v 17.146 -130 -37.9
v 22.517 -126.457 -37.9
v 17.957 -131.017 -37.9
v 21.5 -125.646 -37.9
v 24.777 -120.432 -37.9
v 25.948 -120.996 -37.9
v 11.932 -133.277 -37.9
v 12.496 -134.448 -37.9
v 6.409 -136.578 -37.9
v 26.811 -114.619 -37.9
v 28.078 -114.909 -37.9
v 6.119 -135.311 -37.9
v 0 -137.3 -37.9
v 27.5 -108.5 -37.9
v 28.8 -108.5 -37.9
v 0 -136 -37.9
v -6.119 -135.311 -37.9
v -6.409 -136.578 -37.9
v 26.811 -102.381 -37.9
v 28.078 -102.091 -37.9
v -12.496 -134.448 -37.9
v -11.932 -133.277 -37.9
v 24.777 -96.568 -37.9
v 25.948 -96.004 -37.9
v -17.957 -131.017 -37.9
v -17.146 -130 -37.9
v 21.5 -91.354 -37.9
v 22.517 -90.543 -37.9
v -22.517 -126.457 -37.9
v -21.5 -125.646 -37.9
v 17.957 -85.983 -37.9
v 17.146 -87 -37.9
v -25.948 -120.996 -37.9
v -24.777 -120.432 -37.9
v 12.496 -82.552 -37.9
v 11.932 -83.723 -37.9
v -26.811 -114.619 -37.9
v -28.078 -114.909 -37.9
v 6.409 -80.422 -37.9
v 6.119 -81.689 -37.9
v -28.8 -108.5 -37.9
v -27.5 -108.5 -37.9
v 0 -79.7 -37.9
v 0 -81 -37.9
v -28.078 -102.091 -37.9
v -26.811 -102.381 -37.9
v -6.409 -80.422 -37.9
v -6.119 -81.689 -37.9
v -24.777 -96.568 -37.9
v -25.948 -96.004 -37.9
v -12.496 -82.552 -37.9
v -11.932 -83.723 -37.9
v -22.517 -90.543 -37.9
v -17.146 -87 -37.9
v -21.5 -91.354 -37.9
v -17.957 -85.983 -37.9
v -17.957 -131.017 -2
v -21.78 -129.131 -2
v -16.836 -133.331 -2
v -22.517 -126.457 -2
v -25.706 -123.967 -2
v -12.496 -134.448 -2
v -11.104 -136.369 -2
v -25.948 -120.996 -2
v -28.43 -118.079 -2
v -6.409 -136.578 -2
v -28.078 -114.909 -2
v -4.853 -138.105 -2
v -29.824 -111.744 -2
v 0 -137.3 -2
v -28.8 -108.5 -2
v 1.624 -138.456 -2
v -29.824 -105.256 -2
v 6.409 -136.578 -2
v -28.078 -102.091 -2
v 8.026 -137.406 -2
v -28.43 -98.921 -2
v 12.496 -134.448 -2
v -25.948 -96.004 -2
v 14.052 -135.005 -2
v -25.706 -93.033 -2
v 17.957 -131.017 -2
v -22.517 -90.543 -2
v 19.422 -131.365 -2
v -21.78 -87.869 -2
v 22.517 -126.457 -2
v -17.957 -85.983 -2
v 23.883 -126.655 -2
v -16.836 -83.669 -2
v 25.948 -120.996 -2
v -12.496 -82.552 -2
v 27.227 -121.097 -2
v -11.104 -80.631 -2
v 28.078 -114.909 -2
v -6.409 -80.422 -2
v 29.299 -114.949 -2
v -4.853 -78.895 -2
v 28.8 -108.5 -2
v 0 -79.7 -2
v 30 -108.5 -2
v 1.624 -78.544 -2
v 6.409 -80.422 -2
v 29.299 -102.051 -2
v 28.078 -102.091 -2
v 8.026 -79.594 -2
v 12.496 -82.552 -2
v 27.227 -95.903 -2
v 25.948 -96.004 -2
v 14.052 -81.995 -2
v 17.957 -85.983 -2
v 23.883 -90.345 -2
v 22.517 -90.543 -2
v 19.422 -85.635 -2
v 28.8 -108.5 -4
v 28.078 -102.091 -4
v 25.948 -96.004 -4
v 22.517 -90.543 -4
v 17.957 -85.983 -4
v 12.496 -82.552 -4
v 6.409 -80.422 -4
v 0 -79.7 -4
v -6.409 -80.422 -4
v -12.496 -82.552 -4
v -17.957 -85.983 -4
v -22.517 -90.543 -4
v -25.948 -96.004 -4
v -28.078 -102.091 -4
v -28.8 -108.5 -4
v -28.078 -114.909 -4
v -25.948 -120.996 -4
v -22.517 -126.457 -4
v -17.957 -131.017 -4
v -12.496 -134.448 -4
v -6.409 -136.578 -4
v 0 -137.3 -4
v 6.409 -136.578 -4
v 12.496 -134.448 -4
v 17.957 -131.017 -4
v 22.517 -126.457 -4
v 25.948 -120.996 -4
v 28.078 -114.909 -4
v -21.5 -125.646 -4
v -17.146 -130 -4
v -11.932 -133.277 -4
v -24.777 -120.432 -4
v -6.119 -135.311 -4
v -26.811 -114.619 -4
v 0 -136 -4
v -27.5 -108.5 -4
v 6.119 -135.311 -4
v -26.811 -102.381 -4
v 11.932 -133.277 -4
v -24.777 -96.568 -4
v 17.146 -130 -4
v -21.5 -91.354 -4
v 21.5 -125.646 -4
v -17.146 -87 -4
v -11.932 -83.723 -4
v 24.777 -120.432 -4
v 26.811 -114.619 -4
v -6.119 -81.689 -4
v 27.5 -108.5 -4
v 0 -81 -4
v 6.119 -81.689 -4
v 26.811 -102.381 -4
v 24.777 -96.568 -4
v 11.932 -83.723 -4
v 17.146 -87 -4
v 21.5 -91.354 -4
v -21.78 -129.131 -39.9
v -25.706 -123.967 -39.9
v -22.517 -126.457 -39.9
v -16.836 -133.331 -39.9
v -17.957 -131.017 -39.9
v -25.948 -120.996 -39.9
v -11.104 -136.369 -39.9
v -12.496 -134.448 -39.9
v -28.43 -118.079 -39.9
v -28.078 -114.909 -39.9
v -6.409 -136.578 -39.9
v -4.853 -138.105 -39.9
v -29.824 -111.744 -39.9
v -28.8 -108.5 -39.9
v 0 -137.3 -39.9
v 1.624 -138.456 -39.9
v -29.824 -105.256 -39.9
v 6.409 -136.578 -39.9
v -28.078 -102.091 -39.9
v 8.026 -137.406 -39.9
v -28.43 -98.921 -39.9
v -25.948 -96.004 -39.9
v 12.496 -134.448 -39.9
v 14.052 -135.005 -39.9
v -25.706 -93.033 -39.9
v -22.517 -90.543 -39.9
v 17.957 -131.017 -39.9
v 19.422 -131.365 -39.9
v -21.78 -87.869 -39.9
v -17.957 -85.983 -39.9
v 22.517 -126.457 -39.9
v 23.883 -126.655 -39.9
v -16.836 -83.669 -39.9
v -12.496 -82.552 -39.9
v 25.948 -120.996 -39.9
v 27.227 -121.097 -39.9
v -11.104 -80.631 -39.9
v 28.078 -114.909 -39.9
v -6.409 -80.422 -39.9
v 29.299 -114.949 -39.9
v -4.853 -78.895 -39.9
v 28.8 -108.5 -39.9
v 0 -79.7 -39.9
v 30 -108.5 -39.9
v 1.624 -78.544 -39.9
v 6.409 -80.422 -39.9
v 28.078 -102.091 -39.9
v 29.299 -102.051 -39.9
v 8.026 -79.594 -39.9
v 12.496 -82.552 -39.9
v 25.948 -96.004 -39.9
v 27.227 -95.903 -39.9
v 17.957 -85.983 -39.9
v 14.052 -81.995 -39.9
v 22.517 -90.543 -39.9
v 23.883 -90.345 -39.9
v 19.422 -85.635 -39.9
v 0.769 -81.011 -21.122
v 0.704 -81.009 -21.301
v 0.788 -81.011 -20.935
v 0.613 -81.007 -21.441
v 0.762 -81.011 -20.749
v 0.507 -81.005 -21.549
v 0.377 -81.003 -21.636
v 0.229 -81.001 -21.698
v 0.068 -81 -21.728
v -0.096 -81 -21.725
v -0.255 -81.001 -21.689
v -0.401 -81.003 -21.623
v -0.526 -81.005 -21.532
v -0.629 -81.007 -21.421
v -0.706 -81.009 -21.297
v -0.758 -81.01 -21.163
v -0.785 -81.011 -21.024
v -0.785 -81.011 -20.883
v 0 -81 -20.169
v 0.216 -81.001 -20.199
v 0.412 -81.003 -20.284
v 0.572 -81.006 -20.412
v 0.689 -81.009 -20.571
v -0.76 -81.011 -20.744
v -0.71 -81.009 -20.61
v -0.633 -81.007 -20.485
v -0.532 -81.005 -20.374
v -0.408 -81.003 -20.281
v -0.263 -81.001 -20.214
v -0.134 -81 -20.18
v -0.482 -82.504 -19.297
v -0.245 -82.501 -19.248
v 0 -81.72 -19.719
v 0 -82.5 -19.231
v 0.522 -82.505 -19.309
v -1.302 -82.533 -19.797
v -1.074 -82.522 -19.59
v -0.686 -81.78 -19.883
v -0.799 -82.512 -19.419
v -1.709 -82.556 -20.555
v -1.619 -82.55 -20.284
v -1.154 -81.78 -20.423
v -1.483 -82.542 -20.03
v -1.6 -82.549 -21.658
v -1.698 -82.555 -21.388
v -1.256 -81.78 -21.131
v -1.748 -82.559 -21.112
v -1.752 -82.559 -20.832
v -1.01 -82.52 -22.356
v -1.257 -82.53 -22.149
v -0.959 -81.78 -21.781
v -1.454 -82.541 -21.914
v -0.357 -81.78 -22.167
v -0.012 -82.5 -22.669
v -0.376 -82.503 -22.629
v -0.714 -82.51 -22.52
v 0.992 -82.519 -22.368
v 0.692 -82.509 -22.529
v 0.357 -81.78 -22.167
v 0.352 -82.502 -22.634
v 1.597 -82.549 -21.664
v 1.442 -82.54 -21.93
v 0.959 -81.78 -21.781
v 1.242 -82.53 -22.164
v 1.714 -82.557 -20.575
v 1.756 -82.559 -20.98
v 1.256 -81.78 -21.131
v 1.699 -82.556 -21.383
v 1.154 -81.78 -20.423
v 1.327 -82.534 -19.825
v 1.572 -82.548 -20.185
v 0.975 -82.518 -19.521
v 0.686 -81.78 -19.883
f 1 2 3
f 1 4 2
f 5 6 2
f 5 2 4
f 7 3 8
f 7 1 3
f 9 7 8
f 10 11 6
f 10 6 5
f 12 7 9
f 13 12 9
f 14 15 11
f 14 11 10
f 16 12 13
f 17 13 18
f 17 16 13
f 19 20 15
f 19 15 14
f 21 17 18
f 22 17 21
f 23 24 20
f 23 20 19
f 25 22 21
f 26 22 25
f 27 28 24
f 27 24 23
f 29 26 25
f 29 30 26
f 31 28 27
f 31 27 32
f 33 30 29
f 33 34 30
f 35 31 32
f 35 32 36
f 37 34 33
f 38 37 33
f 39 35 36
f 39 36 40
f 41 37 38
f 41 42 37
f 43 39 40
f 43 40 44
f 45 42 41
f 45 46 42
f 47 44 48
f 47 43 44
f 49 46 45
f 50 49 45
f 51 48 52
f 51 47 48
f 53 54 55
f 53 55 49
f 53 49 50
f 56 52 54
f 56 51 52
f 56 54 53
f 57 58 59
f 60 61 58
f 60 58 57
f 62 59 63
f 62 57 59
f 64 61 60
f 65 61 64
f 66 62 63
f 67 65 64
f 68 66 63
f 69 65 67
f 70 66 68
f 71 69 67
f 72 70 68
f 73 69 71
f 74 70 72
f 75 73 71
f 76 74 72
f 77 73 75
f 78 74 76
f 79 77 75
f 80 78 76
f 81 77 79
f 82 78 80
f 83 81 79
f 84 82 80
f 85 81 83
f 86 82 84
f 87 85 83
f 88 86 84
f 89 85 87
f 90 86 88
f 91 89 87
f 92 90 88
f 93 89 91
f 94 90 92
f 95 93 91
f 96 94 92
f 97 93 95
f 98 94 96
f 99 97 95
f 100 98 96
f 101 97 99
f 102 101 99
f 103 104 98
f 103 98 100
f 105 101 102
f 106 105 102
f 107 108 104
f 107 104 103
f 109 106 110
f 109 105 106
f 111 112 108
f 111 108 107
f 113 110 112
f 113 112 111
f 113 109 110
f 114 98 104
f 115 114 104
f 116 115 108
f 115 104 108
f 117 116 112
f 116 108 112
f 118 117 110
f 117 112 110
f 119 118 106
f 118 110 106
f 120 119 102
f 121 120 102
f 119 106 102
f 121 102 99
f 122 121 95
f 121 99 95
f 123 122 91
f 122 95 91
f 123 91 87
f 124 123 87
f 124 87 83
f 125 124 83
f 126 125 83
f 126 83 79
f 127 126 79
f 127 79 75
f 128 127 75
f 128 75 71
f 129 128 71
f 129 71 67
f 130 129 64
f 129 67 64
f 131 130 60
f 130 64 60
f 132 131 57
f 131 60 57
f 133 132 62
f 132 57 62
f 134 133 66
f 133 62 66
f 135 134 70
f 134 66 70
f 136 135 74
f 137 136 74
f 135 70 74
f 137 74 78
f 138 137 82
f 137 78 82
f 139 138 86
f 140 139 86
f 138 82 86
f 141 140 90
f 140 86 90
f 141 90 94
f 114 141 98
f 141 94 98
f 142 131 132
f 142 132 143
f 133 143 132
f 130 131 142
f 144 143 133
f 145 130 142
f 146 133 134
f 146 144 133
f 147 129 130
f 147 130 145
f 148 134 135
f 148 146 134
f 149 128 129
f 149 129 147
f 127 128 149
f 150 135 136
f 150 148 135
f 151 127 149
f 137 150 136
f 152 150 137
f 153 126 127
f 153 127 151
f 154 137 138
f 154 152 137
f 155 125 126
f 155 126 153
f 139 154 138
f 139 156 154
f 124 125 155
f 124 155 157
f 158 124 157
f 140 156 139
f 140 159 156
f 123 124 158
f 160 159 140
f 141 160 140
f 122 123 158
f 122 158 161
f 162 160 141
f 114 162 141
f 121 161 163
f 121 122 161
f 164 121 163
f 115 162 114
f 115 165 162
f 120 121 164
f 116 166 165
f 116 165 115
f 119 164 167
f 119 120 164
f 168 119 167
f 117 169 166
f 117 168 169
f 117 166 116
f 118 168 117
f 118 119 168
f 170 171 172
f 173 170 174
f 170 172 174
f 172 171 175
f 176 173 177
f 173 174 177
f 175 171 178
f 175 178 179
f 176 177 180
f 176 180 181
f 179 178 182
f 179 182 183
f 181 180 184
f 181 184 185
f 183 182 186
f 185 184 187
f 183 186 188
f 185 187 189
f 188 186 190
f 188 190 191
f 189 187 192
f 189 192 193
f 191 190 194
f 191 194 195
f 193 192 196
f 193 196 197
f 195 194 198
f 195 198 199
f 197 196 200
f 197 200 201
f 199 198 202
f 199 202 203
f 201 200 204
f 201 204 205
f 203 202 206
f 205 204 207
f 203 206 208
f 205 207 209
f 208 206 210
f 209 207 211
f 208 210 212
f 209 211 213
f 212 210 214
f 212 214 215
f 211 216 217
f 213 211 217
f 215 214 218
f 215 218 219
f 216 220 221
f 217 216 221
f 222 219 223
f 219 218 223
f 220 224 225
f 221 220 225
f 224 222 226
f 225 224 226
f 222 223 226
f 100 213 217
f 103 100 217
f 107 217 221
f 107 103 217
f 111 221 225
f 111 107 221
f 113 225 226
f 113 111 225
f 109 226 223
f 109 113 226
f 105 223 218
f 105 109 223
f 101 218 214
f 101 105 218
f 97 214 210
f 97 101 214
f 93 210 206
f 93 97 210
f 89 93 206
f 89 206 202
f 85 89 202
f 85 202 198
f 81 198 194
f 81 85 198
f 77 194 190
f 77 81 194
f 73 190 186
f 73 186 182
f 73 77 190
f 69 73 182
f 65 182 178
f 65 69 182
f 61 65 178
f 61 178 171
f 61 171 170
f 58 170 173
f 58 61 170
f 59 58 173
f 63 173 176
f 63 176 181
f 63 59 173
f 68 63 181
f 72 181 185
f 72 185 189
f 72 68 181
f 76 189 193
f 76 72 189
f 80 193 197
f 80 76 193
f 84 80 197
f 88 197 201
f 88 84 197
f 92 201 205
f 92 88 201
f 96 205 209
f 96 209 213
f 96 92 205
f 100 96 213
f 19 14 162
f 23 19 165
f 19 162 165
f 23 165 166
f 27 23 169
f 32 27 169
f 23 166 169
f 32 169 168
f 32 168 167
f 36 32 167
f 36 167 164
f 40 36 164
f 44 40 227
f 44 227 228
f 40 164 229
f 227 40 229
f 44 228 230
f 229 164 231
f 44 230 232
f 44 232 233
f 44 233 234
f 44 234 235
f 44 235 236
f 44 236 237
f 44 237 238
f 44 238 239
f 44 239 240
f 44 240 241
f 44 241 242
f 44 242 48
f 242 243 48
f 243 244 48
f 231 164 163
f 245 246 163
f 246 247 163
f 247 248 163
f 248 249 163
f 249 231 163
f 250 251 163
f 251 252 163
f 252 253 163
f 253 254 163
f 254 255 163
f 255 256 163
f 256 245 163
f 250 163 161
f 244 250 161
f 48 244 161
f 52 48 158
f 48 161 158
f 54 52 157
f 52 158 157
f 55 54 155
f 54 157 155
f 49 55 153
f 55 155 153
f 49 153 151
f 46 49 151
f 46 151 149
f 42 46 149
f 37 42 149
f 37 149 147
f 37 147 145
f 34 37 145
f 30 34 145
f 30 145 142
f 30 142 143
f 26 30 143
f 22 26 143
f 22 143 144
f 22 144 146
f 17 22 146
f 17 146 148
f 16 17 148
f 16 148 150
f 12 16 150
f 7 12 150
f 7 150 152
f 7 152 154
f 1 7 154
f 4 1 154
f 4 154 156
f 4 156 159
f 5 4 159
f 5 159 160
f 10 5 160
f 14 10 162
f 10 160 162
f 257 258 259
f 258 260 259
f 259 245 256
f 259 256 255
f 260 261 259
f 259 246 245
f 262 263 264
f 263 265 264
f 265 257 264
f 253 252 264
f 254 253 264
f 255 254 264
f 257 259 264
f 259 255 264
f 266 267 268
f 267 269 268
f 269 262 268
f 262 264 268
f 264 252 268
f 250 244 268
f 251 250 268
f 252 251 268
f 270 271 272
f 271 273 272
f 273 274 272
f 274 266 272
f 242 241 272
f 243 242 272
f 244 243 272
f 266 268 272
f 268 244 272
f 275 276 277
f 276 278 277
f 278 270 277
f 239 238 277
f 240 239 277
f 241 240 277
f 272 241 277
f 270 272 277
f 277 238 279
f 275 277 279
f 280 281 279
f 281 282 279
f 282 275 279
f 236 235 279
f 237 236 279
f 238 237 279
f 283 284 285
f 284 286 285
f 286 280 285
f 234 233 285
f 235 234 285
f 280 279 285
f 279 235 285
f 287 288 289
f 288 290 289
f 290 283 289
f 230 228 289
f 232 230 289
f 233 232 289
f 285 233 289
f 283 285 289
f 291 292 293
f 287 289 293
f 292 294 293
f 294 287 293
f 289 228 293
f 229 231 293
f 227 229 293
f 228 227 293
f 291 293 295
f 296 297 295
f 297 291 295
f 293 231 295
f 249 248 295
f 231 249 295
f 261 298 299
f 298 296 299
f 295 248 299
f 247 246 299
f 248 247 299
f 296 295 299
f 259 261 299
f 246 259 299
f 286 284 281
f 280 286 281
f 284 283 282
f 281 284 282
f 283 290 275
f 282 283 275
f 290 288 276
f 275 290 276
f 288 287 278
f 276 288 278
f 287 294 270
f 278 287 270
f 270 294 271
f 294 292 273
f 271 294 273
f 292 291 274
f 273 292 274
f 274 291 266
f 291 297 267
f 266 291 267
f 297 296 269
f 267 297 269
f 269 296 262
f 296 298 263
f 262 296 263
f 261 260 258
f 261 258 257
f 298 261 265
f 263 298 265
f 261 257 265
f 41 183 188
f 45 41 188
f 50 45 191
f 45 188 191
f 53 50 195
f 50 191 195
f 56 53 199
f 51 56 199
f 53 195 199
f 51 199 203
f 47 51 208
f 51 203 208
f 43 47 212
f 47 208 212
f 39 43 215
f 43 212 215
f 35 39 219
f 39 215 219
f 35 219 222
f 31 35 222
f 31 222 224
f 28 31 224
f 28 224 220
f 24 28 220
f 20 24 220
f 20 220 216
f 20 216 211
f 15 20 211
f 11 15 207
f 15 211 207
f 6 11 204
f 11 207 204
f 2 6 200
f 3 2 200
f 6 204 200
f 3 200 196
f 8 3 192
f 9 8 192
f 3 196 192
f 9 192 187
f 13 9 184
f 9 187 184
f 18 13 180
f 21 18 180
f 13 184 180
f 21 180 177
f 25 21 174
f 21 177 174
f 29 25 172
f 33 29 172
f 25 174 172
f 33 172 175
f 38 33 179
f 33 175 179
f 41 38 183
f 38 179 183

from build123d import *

# Parameters (mm, degrees)
BOSS_EXTRUDE1_START = -2
SKETCH1_R           = 30
SKETCH1_R_2         = 27.5
BOSS_EXTRUDE1_DEPTH = 37.9
SKETCH2_R           = 28.8
CUT_EXTRUDE1_DEPTH  = 2
SKETCH3_R           = 28.8
CUT_EXTRUDE2_DEPTH  = 2
SKETCH5_R           = 26
CUT_EXTRUDE3_DEPTH  = 38.9


with BuildPart() as part:
    # Sketch1 → Boss-Extrude1 (new body)
    with BuildSketch(Plane.XY.offset(BOSS_EXTRUDE1_START)):
        with Locations((0, -108.5)):
            Circle(SKETCH1_R)
        with Locations((0, -108.5)):
            Circle(SKETCH1_R_2, mode=Mode.SUBTRACT)
    extrude(amount=-BOSS_EXTRUDE1_DEPTH)

    # Sketch2 → Cut-Extrude1 (cut)
    with BuildSketch(Plane.XY.offset(-2)):
        with Locations((0, -108.5)):
            Circle(SKETCH2_R)
    extrude(amount=-CUT_EXTRUDE1_DEPTH, mode=Mode.SUBTRACT)

    # Sketch3 → Cut-Extrude2 (cut)
    with BuildSketch(Plane(origin=(0, 0, -39.9), x_dir=(-1, 0, 0), z_dir=(0, 0, -1))):
        with Locations((0, -108.5)):
            Circle(SKETCH3_R)
    extrude(amount=-CUT_EXTRUDE2_DEPTH, mode=Mode.SUBTRACT)

    # Sketch4 → Revolve1 (revolve)
    with BuildSketch(Plane(origin=(0, 0, 0), x_dir=(0, 0, -1), z_dir=(1, 0, 0))):
        Polygon((20.95, -79.75), (20.95, -83.75), (18.45, -83.75), align=None)
    revolve(axis=Axis((0, -79.75, -20.95), (0, -1, 0)))

    # Sketch5 → Cut-Extrude3 (cut, through all)
    with BuildSketch(Plane.XY.offset(-2)):
        with Locations((0, -108.5)):
            Circle(SKETCH5_R)
    extrude(amount=-CUT_EXTRUDE3_DEPTH, mode=Mode.SUBTRACT)


solid = part.part
